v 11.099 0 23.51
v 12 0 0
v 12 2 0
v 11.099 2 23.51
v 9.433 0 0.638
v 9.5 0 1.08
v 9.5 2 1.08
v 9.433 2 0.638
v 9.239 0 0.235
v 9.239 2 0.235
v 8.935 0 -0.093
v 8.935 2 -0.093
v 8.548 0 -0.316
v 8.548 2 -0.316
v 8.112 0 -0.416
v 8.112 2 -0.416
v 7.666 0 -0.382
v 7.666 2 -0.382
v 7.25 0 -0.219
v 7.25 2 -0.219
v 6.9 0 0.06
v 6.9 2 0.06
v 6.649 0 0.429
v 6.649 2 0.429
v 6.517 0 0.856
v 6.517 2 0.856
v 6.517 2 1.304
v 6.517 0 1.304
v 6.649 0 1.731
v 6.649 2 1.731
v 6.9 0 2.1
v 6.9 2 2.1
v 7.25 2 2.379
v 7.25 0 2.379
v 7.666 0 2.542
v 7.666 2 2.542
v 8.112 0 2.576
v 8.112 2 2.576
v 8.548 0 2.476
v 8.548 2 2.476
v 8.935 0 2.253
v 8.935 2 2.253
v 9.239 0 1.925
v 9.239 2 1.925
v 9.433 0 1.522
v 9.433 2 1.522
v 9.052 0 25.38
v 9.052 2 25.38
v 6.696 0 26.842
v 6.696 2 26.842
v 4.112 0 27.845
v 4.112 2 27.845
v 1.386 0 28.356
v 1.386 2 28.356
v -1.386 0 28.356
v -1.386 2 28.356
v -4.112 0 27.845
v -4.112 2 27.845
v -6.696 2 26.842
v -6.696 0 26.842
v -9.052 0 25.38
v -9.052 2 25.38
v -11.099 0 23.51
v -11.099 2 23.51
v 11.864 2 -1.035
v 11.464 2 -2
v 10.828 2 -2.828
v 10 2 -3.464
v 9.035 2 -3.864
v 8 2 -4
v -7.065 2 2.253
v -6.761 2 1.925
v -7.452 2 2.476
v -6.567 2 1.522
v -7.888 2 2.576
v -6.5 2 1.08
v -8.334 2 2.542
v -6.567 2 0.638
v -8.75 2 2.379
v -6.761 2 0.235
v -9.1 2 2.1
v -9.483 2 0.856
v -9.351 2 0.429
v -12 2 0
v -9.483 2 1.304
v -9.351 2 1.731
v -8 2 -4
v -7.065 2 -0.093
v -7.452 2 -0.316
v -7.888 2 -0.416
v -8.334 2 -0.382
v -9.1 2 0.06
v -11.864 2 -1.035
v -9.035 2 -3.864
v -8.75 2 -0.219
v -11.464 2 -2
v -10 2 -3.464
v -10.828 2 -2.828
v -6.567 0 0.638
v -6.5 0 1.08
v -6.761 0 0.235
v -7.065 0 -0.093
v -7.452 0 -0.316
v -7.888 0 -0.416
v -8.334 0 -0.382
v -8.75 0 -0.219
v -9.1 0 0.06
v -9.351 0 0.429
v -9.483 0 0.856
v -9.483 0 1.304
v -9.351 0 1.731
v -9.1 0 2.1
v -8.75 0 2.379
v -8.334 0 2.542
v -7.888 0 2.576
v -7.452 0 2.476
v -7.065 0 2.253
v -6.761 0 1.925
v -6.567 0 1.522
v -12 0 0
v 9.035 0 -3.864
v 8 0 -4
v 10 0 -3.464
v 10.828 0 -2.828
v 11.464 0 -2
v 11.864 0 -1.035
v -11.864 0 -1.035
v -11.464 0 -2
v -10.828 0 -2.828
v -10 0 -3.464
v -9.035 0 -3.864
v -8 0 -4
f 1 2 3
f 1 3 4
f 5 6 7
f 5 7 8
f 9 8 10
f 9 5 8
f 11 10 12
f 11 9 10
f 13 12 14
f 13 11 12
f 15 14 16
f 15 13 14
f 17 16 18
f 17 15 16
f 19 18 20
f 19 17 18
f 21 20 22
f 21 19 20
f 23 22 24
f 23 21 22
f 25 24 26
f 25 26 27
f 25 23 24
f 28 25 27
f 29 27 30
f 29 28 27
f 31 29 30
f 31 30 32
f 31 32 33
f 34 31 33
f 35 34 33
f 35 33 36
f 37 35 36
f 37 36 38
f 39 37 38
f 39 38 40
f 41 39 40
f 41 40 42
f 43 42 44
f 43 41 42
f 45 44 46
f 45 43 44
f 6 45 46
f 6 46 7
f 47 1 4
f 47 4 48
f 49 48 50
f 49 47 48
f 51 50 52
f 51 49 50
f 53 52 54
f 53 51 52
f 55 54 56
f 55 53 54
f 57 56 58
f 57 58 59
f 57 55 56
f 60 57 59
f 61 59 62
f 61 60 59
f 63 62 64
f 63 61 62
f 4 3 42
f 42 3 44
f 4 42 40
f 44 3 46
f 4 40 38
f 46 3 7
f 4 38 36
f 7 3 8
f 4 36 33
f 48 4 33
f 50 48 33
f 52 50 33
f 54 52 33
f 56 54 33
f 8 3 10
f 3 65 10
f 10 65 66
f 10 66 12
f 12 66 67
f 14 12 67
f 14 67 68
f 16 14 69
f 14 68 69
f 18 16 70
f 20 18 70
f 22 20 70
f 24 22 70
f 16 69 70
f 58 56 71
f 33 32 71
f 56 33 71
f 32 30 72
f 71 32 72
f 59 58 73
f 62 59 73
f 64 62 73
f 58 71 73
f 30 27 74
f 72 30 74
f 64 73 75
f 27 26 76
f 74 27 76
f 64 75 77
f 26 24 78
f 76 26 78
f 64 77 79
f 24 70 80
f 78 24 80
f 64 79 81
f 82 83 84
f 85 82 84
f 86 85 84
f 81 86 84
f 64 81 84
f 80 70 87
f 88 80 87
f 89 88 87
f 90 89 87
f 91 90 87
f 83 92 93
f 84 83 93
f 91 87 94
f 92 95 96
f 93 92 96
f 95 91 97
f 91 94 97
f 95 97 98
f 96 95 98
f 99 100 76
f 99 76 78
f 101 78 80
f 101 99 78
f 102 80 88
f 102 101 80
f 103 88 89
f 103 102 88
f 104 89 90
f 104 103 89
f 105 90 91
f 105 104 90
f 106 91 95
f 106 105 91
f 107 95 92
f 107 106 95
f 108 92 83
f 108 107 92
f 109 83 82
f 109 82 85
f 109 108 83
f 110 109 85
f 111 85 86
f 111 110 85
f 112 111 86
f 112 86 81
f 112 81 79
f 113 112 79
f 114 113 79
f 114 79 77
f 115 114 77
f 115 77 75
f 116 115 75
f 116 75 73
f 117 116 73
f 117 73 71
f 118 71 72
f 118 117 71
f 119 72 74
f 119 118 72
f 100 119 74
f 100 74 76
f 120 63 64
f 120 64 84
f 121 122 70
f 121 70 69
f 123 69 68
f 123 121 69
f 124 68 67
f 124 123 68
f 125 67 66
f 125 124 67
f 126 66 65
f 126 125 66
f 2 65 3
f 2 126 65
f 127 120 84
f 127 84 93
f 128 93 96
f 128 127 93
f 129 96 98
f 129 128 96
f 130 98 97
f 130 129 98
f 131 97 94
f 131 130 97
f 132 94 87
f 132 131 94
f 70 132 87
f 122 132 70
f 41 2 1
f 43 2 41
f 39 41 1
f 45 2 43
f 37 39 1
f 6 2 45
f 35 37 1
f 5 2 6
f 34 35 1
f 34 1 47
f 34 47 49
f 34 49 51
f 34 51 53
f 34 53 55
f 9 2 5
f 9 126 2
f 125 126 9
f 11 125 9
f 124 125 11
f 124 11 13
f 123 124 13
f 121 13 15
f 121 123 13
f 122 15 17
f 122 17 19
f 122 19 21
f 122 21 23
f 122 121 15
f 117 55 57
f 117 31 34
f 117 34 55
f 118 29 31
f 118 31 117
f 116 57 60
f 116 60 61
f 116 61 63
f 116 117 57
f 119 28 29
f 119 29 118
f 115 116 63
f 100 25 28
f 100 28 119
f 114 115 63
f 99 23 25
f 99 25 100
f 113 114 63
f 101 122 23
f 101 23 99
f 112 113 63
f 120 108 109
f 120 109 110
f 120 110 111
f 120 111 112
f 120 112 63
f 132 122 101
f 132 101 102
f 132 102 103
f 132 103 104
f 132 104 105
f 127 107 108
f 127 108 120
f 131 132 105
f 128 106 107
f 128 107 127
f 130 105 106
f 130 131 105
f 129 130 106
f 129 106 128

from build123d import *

# Parameters (mm, degrees)
SKETCH1_R           = 1.5
BOSS_EXTRUDE1_DEPTH = 2


with BuildPart() as part:
    # Sketch1 → Boss-Extrude1 (new body)
    with BuildSketch(Plane(origin=(0, 0, 0), x_dir=(1, 0, 0), z_dir=(0, 1, 0))):
        with BuildLine():
            Line((-8, 4), (8, 4))
            ThreePointArc((8, 4), (10.828427125, 2.828427125), (12, 0))
            Line((12, 0), (11.099, -23.51))
            ThreePointArc((11.099, -23.51), (0, -28.41979688), (-11.099, -23.51))
            Line((-11.099, -23.51), (-12, 0))
            ThreePointArc((-12, 0), (-10.828427125, 2.828427125), (-8, 4))
        make_face()
        with Locations((-8, -1.08)):
            Circle(SKETCH1_R, mode=Mode.SUBTRACT)
        with Locations((8, -1.08)):
            Circle(SKETCH1_R, mode=Mode.SUBTRACT)
    extrude(amount=BOSS_EXTRUDE1_DEPTH)


solid = part.part
